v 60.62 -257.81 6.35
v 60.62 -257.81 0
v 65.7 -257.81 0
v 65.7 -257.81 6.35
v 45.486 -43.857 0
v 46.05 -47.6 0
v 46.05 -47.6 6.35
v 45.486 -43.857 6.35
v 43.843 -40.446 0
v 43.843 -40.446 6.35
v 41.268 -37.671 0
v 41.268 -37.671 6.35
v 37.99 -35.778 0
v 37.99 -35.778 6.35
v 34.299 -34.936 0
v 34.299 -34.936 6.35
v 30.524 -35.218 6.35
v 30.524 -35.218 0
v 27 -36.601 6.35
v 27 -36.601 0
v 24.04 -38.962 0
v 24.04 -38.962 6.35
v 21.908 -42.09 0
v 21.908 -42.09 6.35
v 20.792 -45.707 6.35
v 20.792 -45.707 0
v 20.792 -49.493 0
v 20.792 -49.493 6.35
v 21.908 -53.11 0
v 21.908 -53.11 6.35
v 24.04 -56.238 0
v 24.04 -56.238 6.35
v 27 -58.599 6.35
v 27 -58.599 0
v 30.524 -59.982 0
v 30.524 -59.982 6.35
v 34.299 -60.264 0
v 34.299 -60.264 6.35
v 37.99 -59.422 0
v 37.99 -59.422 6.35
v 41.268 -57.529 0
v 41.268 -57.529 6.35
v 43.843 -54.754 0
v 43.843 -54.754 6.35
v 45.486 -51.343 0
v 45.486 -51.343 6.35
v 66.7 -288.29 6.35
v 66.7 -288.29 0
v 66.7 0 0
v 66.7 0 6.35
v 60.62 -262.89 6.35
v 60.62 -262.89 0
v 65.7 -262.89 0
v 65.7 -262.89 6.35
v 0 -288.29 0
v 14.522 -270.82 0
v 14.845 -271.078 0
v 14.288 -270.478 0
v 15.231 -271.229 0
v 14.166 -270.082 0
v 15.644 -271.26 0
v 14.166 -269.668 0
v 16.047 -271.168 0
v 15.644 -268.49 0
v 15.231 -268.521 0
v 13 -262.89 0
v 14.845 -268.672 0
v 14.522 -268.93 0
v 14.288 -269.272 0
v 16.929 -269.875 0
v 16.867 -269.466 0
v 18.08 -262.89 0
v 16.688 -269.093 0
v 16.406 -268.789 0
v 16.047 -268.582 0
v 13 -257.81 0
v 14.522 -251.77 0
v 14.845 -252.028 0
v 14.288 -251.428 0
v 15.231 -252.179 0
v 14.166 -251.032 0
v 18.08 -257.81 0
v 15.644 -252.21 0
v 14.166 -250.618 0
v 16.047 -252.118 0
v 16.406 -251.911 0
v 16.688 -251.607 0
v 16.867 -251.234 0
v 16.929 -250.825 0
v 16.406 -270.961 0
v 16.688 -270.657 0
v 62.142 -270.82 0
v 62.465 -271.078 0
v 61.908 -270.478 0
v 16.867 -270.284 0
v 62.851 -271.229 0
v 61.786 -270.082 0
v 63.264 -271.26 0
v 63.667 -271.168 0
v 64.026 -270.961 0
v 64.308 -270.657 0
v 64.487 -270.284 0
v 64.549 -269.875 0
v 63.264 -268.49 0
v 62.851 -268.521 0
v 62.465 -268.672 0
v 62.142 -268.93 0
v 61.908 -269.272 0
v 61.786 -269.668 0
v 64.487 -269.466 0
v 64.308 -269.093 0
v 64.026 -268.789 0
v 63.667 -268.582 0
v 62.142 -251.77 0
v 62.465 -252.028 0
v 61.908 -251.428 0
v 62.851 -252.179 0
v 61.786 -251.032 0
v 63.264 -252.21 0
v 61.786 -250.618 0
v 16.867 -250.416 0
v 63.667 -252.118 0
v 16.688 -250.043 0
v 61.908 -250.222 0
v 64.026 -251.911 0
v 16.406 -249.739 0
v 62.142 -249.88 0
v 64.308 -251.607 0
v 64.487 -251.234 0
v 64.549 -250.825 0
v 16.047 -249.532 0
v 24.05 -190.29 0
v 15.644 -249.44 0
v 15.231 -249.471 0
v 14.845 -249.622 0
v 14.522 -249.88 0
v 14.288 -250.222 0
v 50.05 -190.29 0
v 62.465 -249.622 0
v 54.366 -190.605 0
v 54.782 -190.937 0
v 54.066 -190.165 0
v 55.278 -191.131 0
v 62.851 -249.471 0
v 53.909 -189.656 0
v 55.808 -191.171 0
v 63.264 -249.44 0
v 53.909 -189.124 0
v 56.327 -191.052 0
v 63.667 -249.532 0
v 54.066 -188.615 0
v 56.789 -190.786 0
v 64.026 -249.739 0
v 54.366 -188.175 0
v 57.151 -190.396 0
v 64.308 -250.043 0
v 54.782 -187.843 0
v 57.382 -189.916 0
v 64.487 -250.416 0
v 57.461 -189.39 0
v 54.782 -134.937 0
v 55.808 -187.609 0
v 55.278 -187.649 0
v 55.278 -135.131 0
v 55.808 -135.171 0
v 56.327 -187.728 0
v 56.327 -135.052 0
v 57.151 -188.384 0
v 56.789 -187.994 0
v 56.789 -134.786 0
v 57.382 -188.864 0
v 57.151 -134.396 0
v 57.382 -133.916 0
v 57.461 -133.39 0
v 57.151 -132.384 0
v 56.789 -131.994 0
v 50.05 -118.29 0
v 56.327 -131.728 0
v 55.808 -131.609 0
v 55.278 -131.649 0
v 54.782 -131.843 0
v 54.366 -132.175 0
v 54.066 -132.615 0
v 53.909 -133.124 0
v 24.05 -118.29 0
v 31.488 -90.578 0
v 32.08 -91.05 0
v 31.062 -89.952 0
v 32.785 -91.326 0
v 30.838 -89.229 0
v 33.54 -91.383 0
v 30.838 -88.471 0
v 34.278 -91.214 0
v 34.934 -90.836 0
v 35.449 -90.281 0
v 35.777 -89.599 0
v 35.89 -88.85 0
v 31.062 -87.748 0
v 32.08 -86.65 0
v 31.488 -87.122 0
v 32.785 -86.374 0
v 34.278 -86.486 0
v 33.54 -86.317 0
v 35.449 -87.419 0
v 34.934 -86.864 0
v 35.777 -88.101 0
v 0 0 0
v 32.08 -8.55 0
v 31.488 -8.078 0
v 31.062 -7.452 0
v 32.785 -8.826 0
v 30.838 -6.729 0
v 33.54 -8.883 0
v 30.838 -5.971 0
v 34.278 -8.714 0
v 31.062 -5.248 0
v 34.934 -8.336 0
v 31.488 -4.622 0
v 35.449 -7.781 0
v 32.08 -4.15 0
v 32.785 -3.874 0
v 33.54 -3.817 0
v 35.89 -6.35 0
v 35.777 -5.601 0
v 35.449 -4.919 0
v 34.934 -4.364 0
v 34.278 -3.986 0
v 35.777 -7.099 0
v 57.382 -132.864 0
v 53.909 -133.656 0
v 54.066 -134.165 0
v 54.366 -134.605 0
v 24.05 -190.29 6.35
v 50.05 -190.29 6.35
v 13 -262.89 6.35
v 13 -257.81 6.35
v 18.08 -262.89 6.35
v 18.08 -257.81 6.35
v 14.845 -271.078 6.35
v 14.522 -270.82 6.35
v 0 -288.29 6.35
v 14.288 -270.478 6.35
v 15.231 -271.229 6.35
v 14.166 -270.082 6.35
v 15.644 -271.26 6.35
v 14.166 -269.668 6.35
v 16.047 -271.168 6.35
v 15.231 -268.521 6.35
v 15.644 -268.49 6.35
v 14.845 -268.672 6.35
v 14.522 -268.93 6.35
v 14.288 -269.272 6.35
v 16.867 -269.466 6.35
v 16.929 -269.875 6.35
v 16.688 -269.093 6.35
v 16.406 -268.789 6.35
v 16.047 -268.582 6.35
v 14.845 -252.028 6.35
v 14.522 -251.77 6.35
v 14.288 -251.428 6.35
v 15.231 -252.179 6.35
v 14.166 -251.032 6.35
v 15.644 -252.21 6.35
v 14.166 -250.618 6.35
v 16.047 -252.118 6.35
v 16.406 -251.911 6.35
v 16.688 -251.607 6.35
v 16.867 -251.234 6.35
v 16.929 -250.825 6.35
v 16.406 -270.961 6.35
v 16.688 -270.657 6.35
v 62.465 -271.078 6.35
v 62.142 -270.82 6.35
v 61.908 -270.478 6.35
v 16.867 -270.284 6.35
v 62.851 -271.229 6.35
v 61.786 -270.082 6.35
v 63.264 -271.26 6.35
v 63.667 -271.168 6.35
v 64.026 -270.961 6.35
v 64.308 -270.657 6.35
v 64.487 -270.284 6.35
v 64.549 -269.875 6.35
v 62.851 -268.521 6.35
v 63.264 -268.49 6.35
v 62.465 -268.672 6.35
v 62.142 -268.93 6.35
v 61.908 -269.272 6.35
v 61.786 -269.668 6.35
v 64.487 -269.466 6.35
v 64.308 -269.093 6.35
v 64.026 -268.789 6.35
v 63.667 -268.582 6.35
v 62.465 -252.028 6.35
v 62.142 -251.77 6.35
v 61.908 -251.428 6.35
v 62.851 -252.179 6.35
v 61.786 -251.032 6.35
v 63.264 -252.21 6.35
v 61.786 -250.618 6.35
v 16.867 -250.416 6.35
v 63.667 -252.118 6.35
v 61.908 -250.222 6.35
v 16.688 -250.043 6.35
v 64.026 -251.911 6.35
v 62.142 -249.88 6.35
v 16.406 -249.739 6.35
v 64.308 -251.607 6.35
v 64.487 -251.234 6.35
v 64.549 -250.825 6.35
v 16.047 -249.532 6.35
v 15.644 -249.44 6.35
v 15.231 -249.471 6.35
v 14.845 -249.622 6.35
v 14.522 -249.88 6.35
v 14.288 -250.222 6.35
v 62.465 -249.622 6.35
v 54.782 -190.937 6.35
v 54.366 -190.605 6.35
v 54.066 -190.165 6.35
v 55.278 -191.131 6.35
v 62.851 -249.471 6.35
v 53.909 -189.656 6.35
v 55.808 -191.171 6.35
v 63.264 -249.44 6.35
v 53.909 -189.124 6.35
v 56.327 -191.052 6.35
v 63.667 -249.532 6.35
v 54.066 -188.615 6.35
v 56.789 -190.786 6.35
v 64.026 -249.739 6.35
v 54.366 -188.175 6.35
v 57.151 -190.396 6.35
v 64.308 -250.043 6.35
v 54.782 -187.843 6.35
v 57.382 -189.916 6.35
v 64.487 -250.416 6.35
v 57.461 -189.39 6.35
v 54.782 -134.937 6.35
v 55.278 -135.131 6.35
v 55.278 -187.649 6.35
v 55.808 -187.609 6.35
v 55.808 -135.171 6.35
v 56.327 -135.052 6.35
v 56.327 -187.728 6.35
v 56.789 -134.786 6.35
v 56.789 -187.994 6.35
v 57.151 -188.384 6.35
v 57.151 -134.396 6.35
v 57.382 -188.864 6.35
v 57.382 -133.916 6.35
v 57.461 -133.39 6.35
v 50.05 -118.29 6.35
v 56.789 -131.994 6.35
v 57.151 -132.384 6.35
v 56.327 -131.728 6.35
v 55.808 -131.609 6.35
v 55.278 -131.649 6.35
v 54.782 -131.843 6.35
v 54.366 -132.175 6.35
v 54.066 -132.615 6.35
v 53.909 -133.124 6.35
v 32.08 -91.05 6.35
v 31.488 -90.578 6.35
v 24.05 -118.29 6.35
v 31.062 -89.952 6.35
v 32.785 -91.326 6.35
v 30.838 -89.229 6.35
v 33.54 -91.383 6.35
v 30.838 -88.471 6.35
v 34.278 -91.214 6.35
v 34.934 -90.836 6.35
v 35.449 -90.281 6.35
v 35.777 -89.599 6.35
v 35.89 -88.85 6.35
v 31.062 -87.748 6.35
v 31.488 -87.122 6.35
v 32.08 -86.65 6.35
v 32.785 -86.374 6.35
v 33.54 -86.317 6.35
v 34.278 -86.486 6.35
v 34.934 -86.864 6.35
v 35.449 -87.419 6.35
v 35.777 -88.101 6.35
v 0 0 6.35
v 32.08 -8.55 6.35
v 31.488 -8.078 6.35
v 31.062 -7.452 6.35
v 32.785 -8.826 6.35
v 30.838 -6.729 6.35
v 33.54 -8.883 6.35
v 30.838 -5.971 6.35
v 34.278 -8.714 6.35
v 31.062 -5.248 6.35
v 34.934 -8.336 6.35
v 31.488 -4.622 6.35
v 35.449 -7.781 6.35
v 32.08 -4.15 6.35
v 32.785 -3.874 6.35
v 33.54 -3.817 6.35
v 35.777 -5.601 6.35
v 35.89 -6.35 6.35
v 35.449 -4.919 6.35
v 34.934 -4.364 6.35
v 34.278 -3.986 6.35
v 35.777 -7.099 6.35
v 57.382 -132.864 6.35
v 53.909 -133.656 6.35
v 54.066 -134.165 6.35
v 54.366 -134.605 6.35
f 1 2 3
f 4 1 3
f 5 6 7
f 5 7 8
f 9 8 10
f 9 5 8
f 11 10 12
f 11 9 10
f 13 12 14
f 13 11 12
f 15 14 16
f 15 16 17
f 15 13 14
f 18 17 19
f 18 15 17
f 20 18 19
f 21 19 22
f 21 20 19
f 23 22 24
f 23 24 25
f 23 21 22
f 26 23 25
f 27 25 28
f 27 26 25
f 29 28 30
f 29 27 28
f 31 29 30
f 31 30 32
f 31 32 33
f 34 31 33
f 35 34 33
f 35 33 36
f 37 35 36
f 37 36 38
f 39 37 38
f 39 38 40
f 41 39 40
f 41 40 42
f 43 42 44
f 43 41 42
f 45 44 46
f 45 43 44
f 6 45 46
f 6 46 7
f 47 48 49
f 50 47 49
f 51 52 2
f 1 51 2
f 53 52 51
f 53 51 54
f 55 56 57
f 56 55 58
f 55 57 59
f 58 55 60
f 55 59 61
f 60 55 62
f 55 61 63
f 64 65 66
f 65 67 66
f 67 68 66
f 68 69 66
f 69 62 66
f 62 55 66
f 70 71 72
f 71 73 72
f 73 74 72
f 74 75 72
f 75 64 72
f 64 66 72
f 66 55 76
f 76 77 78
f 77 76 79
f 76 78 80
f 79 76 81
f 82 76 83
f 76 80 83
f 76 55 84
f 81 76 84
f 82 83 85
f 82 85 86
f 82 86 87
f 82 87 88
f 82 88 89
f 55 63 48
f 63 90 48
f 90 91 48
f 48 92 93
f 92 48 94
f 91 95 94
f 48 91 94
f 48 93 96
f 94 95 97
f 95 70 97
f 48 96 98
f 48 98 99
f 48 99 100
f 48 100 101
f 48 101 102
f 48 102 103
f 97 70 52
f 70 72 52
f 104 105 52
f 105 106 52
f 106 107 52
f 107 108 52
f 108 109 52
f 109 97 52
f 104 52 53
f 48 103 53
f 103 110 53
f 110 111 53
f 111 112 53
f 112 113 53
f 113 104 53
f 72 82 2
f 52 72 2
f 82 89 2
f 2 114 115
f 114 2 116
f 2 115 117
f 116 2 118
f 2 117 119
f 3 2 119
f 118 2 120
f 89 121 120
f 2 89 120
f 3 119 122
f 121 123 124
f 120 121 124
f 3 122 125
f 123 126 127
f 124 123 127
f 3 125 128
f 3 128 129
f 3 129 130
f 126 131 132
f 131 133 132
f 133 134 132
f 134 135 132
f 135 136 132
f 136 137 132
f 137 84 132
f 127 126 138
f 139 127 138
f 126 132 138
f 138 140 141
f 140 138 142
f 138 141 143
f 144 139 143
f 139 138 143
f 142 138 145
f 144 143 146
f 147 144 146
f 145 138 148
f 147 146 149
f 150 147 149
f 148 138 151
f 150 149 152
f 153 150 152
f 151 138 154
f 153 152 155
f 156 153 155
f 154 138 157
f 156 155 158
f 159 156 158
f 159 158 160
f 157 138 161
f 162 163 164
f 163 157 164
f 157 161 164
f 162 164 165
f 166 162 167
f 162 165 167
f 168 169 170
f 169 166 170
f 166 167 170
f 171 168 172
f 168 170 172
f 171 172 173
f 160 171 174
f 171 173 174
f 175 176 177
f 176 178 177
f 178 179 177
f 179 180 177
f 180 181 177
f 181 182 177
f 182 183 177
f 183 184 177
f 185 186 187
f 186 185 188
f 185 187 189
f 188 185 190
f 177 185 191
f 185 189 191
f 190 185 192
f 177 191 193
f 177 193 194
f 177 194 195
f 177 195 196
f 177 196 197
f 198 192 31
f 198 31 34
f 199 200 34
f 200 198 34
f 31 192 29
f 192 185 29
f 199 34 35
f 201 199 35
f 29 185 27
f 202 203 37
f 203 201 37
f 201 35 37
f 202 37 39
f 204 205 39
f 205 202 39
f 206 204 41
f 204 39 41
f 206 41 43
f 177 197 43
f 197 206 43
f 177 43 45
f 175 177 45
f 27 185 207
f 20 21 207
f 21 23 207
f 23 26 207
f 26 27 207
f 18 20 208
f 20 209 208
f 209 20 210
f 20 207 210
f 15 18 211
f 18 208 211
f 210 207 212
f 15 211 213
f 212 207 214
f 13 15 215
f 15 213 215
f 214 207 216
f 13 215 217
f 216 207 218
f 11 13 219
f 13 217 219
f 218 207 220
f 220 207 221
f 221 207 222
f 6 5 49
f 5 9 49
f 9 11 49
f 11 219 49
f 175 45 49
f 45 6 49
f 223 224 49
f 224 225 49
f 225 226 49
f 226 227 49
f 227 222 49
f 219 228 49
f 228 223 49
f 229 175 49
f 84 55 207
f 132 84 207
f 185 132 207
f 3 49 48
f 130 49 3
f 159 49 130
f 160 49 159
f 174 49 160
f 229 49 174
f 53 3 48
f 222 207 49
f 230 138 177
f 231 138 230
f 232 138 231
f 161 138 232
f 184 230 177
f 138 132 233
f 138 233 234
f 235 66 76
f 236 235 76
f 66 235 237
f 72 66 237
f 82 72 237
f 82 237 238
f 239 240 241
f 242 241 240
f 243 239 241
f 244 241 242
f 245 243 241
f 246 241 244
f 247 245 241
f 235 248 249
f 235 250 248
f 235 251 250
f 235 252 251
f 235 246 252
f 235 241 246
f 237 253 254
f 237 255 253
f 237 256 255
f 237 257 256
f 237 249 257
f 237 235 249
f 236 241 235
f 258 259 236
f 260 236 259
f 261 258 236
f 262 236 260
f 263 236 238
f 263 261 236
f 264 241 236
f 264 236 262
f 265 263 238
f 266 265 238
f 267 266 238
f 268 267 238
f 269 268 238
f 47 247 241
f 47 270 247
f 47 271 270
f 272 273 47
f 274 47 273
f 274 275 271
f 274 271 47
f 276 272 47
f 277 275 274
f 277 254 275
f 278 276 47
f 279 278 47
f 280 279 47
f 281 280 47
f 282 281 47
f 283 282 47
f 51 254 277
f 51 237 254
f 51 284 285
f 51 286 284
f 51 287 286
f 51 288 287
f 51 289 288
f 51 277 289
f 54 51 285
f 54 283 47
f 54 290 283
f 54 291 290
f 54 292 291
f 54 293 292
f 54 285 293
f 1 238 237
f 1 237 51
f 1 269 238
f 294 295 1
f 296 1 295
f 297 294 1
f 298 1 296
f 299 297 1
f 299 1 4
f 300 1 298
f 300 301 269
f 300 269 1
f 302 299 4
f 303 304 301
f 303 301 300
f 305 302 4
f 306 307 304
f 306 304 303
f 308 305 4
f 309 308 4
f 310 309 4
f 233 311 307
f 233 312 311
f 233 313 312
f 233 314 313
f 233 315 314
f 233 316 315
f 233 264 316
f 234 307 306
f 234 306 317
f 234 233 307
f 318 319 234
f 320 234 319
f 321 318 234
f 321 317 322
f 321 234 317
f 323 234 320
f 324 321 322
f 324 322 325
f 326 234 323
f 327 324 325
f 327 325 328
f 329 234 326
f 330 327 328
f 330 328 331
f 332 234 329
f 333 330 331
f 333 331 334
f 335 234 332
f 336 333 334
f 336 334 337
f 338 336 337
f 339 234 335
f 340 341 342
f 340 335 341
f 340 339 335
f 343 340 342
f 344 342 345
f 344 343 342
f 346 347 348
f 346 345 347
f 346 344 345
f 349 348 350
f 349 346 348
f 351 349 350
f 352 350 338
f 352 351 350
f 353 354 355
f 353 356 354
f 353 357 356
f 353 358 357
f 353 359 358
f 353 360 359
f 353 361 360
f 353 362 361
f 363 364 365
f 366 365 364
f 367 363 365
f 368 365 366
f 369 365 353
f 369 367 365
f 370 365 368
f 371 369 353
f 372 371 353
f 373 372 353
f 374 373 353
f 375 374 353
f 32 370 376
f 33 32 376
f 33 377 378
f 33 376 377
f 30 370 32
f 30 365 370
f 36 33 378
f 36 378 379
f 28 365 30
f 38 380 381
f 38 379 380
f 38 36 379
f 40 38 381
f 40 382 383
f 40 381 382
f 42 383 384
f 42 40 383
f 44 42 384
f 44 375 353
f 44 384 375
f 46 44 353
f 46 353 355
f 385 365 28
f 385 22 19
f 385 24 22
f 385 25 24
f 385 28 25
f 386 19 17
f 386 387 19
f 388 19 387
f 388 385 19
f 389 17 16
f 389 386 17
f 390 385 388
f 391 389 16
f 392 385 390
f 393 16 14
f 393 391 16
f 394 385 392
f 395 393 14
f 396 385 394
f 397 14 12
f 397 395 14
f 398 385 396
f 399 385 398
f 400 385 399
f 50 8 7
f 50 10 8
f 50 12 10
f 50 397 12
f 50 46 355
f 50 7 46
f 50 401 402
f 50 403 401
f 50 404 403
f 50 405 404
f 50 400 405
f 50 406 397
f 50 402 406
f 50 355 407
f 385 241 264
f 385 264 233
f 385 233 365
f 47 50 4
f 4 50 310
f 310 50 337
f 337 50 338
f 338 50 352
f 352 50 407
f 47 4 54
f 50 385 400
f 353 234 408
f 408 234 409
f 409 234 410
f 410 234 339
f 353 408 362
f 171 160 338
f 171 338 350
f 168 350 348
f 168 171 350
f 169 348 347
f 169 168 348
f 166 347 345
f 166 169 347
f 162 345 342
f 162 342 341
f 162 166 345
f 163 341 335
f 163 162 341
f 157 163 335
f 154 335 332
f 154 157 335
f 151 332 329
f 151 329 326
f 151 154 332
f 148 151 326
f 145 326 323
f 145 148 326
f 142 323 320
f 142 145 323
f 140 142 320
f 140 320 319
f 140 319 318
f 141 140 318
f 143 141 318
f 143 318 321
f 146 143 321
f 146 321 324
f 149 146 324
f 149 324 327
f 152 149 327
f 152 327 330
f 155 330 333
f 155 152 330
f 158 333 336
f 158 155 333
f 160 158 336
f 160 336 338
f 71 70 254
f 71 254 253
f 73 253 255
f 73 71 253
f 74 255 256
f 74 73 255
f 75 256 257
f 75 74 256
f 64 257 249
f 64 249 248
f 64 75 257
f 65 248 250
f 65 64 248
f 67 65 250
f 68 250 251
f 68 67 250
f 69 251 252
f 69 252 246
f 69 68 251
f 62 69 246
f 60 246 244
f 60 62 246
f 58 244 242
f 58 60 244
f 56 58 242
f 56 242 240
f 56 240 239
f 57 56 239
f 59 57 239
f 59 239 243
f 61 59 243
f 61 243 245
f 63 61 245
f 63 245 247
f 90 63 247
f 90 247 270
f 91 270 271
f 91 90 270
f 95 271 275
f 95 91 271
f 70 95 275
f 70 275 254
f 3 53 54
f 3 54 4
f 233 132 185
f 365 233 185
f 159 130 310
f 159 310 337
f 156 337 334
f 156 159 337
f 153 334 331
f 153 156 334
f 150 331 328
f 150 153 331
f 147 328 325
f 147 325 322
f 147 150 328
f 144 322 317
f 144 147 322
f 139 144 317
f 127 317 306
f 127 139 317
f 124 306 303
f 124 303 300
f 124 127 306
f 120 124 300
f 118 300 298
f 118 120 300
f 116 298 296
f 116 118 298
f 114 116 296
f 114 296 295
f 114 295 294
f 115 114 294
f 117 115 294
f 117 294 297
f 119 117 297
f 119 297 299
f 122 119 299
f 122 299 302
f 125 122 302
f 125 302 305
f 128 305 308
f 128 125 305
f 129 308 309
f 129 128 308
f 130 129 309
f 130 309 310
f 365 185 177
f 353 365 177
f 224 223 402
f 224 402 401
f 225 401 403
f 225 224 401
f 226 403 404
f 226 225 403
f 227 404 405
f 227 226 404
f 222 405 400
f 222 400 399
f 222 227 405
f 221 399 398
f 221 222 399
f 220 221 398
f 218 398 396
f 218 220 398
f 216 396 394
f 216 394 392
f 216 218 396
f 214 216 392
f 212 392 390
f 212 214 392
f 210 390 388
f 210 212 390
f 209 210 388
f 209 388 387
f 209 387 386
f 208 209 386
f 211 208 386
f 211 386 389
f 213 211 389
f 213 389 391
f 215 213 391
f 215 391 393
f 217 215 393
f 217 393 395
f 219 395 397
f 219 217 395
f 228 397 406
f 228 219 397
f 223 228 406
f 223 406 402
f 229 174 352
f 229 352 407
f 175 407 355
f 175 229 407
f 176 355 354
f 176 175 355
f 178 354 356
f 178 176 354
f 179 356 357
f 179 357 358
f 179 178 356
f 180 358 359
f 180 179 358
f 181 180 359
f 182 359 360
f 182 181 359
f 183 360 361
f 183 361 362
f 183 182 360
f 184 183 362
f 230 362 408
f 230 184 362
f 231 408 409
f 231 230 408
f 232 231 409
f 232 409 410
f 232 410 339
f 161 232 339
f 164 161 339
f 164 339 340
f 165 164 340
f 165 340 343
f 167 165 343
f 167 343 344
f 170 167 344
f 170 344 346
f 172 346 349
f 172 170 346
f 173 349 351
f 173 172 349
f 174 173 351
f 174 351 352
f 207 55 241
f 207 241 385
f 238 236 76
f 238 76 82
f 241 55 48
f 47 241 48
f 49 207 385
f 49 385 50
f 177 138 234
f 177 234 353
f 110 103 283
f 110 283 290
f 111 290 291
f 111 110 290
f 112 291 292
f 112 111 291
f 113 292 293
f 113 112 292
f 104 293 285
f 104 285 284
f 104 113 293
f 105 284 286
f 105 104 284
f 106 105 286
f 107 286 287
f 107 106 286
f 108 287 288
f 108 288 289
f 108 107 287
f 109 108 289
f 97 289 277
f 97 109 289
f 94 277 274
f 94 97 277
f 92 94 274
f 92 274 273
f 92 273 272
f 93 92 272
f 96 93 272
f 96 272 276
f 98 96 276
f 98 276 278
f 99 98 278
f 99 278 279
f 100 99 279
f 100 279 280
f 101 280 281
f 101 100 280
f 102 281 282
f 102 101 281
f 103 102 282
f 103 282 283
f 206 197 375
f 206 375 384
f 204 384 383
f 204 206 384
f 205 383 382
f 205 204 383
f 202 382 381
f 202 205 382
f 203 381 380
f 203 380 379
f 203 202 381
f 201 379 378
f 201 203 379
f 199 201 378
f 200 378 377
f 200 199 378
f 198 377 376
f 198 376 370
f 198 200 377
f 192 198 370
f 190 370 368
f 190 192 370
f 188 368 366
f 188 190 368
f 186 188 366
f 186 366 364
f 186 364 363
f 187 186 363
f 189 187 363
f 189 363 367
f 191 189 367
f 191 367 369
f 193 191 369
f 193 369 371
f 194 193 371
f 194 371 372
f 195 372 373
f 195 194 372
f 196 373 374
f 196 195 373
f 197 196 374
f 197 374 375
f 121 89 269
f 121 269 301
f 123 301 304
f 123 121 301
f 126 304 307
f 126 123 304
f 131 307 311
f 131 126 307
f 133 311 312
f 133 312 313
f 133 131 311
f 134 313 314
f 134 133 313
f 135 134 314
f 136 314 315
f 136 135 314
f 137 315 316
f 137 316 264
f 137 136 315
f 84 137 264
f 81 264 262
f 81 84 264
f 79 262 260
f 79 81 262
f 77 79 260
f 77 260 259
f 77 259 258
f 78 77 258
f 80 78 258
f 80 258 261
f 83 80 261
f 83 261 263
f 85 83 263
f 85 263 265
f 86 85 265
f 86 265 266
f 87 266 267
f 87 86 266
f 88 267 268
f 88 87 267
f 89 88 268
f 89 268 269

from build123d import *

# Parameters (mm, degrees)
SKETCH1_W           = 66.7
SKETCH1_H           = 288.29
SKETCH1_R           = 1.3890625
SKETCH1_R_2         = 1.7859375
SKETCH1_R_3         = 2.54
SKETCH1_R_4         = 12.7
SKETCH1_W_2         = 5.08
SKETCH1_H_2         = 5.08
SKETCH1_W_3         = 26
SKETCH1_H_3         = 72
BOSS_EXTRUDE1_DEPTH = 6.35


with BuildPart() as part:
    # Sketch1 → Boss-Extrude1 (new body)
    with BuildSketch(Plane.XY):
        with Locations((33.35, -144.145)):
            Rectangle(SKETCH1_W, SKETCH1_H)
        with Locations((63.16, -269.875)):
            Circle(SKETCH1_R, mode=Mode.SUBTRACT)
        with Locations((63.16, -250.825)):
            Circle(SKETCH1_R, mode=Mode.SUBTRACT)
        with Locations((15.54, -250.825)):
            Circle(SKETCH1_R, mode=Mode.SUBTRACT)
        with Locations((15.54, -269.875)):
            Circle(SKETCH1_R, mode=Mode.SUBTRACT)
        with Locations((55.675, -133.39)):
            Circle(SKETCH1_R_2, mode=Mode.SUBTRACT)
        with Locations((55.675, -189.39)):
            Circle(SKETCH1_R_2, mode=Mode.SUBTRACT)
        with Locations((33.35, -88.85)):
            Circle(SKETCH1_R_3, mode=Mode.SUBTRACT)
        with Locations((33.35, -47.6)):
            Circle(SKETCH1_R_4, mode=Mode.SUBTRACT)
        with Locations((33.35, -6.35)):
            Circle(SKETCH1_R_3, mode=Mode.SUBTRACT)
        with Locations((63.16, -260.35)):
            Rectangle(SKETCH1_W_2, SKETCH1_H_2, mode=Mode.SUBTRACT)
        with Locations((15.54, -260.35)):
            Rectangle(SKETCH1_W_2, SKETCH1_H_2, mode=Mode.SUBTRACT)
        with Locations((37.05, -154.29)):
            Rectangle(SKETCH1_W_3, SKETCH1_H_3, mode=Mode.SUBTRACT)
    extrude(amount=BOSS_EXTRUDE1_DEPTH)


solid = part.part
